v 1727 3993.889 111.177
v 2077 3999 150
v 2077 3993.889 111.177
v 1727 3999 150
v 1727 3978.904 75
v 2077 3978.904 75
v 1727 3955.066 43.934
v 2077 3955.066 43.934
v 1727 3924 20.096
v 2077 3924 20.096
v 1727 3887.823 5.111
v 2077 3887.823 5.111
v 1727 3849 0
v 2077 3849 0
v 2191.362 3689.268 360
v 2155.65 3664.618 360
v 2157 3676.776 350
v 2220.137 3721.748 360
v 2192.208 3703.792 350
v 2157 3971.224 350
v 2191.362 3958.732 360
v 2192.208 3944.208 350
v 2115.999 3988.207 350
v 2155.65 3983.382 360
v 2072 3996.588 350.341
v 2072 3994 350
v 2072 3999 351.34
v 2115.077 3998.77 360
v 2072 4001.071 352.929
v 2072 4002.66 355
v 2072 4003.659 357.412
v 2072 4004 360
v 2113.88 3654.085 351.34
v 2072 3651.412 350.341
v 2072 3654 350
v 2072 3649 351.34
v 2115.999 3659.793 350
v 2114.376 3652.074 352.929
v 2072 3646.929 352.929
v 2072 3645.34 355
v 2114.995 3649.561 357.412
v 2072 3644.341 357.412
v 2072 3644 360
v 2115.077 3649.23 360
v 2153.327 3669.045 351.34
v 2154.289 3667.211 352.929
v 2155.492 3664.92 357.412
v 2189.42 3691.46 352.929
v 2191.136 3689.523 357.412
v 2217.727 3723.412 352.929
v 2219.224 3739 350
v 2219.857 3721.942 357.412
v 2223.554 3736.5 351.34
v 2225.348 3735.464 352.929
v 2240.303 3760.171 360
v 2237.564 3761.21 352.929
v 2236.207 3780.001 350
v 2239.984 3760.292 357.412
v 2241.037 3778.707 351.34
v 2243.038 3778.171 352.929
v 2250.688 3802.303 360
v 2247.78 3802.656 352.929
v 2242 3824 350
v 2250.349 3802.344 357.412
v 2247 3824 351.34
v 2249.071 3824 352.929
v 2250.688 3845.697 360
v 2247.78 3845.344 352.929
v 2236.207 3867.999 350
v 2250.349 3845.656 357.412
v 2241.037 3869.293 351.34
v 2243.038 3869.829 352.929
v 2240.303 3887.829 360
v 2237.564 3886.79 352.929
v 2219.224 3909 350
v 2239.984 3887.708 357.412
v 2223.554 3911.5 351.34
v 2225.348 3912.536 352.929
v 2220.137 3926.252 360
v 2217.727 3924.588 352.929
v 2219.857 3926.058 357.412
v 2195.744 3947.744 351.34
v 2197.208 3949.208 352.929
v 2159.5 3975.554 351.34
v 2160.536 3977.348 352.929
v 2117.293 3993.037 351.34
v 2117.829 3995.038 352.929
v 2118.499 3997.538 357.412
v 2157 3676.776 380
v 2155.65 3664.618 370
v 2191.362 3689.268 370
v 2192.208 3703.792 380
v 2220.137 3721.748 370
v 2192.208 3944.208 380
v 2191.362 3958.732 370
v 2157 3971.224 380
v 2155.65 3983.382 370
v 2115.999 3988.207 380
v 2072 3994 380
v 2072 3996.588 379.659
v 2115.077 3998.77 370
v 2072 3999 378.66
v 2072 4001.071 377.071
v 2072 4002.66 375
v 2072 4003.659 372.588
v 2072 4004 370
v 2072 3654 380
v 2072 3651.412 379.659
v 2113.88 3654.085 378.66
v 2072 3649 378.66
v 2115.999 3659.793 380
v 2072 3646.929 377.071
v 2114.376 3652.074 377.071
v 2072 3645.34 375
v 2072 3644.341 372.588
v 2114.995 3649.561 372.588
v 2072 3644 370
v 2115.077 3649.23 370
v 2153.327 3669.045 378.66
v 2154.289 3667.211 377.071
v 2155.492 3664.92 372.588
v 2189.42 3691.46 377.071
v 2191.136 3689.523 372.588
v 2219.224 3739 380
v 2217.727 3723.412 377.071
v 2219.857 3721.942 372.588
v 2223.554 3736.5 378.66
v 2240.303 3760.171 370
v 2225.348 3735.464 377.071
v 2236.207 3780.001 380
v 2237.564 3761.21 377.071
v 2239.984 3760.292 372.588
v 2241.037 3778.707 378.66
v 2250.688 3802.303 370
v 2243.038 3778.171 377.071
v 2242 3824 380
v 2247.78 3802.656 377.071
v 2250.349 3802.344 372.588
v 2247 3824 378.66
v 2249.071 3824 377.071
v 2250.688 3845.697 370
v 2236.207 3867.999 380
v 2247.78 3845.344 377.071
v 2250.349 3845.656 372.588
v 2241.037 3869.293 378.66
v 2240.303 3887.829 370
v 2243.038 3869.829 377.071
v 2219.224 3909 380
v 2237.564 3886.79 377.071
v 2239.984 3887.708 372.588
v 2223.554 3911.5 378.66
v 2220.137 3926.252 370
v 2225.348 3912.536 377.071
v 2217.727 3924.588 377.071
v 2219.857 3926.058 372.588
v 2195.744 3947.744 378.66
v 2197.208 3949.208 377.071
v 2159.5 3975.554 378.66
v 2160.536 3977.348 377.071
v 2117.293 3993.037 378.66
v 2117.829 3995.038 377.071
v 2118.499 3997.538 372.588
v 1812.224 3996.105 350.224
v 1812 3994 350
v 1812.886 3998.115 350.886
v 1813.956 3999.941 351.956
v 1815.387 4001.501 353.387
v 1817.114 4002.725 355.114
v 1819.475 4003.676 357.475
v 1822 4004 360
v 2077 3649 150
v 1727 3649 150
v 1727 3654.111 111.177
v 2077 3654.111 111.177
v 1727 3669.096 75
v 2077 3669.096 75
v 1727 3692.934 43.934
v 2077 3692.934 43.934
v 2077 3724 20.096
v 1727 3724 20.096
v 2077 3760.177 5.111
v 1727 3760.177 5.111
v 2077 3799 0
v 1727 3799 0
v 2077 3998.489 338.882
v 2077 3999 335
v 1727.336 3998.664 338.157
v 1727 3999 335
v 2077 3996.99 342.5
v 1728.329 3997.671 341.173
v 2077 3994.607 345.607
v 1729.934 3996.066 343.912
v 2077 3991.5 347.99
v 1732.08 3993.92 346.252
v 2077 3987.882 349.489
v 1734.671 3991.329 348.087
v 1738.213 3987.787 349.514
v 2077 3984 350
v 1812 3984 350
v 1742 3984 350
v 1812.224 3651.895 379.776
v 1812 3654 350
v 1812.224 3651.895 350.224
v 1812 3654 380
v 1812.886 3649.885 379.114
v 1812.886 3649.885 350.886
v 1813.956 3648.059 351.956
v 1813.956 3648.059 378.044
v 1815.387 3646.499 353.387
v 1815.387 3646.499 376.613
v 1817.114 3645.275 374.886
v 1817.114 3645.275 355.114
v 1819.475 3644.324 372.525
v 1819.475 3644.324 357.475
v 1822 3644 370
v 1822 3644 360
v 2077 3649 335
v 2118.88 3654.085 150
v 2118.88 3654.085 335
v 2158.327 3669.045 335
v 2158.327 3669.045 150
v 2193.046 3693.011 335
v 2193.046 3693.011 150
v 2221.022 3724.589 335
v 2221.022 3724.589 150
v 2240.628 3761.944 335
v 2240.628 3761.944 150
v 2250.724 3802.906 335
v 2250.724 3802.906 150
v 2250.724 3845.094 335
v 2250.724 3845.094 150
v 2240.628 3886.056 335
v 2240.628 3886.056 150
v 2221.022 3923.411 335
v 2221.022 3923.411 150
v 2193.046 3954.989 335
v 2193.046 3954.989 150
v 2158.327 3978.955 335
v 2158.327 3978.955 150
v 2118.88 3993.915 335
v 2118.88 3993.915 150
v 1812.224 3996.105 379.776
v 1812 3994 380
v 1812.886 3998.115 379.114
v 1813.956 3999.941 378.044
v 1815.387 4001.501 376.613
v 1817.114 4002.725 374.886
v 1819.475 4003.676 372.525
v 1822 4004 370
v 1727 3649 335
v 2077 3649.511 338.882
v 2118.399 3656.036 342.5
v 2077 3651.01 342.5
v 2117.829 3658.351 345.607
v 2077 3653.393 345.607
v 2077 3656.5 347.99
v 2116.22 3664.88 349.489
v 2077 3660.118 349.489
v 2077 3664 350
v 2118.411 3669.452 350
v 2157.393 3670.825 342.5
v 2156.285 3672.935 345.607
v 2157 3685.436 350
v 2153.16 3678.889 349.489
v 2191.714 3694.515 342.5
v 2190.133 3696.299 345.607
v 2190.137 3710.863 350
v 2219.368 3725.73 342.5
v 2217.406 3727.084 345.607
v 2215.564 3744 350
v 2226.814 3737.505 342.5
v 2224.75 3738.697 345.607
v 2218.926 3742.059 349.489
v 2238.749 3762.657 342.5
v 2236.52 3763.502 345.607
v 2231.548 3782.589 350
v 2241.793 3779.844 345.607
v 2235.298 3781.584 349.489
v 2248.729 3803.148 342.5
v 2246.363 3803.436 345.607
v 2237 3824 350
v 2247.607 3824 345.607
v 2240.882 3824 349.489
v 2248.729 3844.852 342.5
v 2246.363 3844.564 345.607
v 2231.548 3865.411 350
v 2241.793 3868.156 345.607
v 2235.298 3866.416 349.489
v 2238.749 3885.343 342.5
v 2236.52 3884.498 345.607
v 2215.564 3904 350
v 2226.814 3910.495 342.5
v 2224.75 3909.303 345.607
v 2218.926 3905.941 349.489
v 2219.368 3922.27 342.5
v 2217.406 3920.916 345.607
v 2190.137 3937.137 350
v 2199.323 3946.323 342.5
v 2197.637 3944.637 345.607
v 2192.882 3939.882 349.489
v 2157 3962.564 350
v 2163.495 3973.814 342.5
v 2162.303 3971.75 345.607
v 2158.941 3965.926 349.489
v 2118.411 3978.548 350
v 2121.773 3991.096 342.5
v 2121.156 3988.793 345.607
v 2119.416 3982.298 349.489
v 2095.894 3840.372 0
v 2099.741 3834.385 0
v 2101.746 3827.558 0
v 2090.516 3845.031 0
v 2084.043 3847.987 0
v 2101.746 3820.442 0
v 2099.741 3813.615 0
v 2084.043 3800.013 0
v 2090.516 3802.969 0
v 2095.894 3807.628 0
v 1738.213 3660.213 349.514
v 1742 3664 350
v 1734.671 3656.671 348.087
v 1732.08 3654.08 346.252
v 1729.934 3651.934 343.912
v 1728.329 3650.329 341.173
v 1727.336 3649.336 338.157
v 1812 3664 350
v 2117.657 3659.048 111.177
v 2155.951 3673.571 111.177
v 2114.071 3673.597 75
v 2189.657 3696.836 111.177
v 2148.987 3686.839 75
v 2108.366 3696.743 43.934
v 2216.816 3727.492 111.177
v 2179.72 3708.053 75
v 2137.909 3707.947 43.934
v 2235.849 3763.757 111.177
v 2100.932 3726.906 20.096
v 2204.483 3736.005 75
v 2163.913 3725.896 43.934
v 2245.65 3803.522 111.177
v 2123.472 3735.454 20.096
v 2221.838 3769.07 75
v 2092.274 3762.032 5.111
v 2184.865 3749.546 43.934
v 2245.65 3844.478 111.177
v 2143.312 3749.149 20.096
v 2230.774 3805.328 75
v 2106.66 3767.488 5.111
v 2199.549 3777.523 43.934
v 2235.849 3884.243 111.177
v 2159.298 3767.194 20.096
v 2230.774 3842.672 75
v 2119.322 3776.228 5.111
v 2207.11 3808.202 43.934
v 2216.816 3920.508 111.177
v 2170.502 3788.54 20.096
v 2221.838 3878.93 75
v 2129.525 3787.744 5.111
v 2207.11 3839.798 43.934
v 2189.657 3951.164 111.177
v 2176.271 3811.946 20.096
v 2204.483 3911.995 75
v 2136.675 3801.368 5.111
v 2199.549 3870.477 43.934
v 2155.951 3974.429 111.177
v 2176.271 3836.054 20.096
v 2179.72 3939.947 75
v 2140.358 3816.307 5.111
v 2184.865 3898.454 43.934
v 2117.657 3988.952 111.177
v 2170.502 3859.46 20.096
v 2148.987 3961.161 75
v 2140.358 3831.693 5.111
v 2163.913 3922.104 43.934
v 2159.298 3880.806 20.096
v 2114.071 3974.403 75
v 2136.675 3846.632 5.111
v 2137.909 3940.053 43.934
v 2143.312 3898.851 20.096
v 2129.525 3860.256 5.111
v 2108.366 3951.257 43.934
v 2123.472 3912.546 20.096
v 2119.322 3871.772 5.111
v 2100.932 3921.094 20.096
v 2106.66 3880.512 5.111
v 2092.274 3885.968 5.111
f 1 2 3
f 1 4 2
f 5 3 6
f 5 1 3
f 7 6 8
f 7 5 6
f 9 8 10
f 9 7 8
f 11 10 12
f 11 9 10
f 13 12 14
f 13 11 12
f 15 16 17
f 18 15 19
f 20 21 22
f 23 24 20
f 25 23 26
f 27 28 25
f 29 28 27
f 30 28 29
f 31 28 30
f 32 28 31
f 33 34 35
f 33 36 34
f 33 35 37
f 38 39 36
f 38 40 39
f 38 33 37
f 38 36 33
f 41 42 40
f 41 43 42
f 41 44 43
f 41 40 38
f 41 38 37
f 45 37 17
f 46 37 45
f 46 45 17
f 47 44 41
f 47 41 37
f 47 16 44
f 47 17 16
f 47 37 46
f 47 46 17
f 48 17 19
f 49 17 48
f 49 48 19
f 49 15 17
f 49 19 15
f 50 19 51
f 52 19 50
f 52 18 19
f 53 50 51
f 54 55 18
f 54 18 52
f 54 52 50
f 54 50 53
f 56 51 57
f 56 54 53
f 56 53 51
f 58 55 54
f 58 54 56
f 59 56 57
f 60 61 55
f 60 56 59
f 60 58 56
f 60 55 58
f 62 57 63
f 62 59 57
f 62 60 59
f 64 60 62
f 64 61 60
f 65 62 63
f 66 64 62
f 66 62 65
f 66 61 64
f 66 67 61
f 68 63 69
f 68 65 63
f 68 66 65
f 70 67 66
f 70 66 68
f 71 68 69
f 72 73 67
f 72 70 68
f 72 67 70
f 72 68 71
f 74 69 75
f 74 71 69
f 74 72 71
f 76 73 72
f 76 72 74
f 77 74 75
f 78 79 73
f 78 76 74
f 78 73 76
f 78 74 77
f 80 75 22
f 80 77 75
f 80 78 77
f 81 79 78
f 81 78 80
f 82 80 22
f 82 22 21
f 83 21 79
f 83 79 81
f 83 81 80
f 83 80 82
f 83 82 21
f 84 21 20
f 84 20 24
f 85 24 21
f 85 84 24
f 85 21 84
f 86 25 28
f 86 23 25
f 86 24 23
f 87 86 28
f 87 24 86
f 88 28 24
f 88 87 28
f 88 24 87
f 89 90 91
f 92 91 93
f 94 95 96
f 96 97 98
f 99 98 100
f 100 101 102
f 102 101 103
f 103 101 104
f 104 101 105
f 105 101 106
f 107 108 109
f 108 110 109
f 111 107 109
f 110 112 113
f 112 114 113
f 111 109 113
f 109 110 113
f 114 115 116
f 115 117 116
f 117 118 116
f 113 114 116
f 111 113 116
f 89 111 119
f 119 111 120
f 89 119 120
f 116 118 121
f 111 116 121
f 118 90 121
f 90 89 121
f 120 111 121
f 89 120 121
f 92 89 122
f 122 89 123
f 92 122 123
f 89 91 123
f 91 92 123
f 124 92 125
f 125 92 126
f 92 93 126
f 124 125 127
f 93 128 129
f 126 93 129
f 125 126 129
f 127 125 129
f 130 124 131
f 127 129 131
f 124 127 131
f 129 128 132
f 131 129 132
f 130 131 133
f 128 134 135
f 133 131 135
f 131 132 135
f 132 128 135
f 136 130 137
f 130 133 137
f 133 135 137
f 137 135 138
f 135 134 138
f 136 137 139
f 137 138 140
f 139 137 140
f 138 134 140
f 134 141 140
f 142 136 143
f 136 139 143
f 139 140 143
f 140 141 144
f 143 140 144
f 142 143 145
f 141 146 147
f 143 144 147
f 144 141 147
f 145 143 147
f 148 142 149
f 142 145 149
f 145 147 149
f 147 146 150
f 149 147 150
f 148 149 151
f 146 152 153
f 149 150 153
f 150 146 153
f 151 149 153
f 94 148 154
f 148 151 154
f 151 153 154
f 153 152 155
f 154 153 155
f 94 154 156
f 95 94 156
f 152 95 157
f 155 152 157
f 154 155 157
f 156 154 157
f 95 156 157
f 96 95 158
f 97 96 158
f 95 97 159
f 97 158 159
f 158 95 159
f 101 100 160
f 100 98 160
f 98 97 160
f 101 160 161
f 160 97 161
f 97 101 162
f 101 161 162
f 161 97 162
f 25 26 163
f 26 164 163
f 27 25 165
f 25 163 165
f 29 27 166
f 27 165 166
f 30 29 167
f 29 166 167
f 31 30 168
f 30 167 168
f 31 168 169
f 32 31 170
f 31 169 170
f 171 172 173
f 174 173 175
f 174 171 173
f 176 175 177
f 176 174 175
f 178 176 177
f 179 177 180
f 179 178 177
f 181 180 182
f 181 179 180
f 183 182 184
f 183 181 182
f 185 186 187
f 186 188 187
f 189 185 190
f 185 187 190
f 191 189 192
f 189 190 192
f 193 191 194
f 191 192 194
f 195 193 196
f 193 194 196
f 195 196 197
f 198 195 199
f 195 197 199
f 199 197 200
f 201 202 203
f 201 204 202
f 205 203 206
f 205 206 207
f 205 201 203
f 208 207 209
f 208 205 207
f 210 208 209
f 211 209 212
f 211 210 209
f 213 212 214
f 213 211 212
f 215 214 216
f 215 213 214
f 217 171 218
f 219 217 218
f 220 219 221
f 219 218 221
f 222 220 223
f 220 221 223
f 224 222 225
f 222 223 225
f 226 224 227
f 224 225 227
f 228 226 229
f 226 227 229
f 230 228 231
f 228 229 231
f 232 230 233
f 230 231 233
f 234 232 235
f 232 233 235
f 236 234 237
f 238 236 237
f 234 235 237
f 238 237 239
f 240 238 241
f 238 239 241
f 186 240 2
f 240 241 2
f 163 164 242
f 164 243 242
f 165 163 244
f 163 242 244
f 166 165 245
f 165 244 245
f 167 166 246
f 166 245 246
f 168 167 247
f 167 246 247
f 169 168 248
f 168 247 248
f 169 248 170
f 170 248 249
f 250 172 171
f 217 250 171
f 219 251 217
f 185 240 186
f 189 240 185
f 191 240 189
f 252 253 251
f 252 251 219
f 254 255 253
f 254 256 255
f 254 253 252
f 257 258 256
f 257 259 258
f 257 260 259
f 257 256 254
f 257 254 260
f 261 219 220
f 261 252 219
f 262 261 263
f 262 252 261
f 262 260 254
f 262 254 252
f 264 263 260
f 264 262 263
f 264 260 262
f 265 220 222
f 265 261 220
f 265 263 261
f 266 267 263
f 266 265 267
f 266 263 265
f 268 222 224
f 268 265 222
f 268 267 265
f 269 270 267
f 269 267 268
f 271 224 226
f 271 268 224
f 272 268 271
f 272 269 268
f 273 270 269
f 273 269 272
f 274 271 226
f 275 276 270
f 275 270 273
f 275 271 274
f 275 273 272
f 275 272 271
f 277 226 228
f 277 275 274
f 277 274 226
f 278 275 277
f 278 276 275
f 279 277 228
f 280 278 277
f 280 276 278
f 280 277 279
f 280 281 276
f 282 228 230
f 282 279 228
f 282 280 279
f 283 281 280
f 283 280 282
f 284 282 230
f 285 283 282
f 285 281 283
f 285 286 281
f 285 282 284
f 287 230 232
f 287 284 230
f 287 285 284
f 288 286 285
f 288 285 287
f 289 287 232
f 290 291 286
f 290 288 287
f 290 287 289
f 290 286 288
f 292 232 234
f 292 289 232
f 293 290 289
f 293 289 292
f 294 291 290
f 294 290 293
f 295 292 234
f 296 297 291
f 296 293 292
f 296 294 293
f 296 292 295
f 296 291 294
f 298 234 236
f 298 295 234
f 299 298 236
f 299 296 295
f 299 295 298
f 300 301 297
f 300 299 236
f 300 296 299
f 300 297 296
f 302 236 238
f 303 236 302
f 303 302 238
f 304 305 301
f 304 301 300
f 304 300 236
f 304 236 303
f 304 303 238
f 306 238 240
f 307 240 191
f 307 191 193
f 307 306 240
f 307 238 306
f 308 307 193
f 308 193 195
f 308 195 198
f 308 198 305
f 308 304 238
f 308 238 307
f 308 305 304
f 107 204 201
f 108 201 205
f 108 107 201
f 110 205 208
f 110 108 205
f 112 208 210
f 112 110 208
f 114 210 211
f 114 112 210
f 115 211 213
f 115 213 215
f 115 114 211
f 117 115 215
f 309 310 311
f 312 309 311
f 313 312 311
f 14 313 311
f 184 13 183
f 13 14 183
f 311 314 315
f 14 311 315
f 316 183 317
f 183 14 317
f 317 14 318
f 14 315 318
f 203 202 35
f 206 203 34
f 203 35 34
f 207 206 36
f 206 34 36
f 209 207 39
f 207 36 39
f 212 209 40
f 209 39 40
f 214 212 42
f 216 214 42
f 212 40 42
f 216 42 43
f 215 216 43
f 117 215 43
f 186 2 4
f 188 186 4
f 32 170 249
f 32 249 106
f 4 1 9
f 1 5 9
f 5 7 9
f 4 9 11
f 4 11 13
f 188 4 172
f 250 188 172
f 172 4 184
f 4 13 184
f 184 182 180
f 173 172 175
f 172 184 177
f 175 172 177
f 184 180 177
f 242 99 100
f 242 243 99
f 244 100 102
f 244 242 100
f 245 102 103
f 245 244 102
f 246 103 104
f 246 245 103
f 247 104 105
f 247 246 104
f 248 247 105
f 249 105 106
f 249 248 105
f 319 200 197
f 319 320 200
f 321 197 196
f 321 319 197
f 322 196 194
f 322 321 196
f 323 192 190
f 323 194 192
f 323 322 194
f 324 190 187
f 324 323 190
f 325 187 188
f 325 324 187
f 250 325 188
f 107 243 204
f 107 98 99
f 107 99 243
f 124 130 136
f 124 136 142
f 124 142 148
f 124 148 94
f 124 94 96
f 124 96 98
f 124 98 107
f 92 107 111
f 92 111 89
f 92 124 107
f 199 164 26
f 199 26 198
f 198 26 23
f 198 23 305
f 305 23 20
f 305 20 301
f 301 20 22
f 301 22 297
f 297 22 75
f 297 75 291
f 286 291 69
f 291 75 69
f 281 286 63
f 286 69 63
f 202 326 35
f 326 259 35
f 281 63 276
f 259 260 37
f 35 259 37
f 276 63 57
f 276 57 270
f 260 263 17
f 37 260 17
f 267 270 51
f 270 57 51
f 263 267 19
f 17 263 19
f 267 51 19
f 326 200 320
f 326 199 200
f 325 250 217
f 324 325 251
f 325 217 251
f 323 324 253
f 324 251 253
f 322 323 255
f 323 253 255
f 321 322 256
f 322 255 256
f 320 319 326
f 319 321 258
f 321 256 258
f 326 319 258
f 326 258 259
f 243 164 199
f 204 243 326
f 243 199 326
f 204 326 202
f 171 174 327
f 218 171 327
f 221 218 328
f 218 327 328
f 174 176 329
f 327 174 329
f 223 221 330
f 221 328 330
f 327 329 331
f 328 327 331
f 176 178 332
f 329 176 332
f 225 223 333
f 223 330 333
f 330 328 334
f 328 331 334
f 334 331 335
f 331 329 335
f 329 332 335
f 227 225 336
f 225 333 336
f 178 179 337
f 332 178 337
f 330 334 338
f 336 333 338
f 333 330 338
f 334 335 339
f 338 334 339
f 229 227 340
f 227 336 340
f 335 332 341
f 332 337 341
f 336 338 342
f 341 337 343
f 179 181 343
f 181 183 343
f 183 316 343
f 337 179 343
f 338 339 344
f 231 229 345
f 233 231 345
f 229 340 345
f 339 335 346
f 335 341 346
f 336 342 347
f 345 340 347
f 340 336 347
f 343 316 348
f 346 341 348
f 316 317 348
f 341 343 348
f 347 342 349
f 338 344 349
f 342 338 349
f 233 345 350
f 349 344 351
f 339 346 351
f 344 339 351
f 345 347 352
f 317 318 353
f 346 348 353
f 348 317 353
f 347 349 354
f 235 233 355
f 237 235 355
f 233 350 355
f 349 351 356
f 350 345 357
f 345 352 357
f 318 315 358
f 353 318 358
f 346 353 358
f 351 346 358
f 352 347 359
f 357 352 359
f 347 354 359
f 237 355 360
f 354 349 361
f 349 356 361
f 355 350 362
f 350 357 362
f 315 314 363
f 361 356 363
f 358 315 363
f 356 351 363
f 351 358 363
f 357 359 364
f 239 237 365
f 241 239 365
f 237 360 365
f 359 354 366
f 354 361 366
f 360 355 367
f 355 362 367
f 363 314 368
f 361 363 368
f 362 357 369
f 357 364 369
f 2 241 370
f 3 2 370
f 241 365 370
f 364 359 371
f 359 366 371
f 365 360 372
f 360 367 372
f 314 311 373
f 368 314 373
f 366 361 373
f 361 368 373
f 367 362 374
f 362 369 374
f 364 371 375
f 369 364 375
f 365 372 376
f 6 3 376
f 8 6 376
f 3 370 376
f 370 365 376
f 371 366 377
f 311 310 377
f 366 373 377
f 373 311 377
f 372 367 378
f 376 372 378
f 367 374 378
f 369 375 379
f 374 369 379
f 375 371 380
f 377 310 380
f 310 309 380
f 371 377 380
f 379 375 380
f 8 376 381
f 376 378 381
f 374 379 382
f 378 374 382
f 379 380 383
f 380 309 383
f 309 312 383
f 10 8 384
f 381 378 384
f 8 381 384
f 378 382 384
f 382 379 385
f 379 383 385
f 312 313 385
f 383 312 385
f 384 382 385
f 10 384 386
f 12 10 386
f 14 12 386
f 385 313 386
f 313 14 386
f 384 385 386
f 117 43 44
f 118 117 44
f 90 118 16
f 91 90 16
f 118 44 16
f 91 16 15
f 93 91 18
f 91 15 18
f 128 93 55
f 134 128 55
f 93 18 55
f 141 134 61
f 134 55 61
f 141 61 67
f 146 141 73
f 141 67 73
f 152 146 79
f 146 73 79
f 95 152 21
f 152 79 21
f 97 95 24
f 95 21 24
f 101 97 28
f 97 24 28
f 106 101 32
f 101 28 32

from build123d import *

# Parameters (mm, degrees)
PAD014_DEPTH            = 350
FILLET013_R             = 150
FILLET014_R             = 15
PAD015_DEPTH            = 30
FILLET015_R             = 10
BODY010_PLACEMENT_ANGLE = 270


with BuildPart() as part:
    # Sketch194 → Pad014 (new body)
    with BuildSketch(Plane.XY):
        with BuildLine():
            Line((0, 350), (0, 0))
            Line((0, 0), (350, 0))
            Line((350, 0), (350, 350))
            ThreePointArc((350, 350), (175, 525), (0, 350))
        make_face()
    extrude(amount=PAD014_DEPTH)

    # Fillet013
    fillet013_edges = [part.edges().sort_by_distance(p)[0] for p in [
        (350, 175, 0),
        (175, 525, 0),
        (0, 175, 0),
    ]]
    fillet(fillet013_edges, radius=FILLET013_R)

    # Fillet014
    fillet014_edges = [part.edges().sort_by_distance(p)[0] for p in [
        (0, 175, 350),
        (175, 0, 350),
        (350, 175, 350),
        (175, 525, 350),
    ]]
    fillet(fillet014_edges, radius=FILLET014_R)

    # Sketch195 (on Face4 of Fillet013) → Pad015 (join)
    with BuildSketch(Plane.XY.offset(350)):
        with BuildLine():
            Line((-5, 85), (355, 85))
            Line((355, 85), (355, 345))
            ThreePointArc((355, 345), (175, 525), (-5, 345))
            Line((-5, 85), (-5, 345))
        make_face()
    extrude(amount=PAD015_DEPTH)

    # Fillet015
    fillet015_edges = [part.edges().sort_by_distance(p)[0] for p in [
        (355, 345, 365),
        (-5, 345, 365),
        (175, 525, 350),
        (175, 525, 380),
        (-5, 85, 365),
        (-5, 215, 350),
        (-5, 215, 380),
        (355, 85, 365),
        (355, 215, 350),
        (355, 215, 380),
    ]]
    fillet(fillet015_edges, radius=FILLET015_R)


with BuildPart() as part_1:
    # Body010 placement: moved
    add(part.part.moved(Location((1727, 3999, 0))).rotate(Axis((1727, 3999, 0), (0, 0, 1)), BODY010_PLACEMENT_ANGLE))


solid = part_1.part
